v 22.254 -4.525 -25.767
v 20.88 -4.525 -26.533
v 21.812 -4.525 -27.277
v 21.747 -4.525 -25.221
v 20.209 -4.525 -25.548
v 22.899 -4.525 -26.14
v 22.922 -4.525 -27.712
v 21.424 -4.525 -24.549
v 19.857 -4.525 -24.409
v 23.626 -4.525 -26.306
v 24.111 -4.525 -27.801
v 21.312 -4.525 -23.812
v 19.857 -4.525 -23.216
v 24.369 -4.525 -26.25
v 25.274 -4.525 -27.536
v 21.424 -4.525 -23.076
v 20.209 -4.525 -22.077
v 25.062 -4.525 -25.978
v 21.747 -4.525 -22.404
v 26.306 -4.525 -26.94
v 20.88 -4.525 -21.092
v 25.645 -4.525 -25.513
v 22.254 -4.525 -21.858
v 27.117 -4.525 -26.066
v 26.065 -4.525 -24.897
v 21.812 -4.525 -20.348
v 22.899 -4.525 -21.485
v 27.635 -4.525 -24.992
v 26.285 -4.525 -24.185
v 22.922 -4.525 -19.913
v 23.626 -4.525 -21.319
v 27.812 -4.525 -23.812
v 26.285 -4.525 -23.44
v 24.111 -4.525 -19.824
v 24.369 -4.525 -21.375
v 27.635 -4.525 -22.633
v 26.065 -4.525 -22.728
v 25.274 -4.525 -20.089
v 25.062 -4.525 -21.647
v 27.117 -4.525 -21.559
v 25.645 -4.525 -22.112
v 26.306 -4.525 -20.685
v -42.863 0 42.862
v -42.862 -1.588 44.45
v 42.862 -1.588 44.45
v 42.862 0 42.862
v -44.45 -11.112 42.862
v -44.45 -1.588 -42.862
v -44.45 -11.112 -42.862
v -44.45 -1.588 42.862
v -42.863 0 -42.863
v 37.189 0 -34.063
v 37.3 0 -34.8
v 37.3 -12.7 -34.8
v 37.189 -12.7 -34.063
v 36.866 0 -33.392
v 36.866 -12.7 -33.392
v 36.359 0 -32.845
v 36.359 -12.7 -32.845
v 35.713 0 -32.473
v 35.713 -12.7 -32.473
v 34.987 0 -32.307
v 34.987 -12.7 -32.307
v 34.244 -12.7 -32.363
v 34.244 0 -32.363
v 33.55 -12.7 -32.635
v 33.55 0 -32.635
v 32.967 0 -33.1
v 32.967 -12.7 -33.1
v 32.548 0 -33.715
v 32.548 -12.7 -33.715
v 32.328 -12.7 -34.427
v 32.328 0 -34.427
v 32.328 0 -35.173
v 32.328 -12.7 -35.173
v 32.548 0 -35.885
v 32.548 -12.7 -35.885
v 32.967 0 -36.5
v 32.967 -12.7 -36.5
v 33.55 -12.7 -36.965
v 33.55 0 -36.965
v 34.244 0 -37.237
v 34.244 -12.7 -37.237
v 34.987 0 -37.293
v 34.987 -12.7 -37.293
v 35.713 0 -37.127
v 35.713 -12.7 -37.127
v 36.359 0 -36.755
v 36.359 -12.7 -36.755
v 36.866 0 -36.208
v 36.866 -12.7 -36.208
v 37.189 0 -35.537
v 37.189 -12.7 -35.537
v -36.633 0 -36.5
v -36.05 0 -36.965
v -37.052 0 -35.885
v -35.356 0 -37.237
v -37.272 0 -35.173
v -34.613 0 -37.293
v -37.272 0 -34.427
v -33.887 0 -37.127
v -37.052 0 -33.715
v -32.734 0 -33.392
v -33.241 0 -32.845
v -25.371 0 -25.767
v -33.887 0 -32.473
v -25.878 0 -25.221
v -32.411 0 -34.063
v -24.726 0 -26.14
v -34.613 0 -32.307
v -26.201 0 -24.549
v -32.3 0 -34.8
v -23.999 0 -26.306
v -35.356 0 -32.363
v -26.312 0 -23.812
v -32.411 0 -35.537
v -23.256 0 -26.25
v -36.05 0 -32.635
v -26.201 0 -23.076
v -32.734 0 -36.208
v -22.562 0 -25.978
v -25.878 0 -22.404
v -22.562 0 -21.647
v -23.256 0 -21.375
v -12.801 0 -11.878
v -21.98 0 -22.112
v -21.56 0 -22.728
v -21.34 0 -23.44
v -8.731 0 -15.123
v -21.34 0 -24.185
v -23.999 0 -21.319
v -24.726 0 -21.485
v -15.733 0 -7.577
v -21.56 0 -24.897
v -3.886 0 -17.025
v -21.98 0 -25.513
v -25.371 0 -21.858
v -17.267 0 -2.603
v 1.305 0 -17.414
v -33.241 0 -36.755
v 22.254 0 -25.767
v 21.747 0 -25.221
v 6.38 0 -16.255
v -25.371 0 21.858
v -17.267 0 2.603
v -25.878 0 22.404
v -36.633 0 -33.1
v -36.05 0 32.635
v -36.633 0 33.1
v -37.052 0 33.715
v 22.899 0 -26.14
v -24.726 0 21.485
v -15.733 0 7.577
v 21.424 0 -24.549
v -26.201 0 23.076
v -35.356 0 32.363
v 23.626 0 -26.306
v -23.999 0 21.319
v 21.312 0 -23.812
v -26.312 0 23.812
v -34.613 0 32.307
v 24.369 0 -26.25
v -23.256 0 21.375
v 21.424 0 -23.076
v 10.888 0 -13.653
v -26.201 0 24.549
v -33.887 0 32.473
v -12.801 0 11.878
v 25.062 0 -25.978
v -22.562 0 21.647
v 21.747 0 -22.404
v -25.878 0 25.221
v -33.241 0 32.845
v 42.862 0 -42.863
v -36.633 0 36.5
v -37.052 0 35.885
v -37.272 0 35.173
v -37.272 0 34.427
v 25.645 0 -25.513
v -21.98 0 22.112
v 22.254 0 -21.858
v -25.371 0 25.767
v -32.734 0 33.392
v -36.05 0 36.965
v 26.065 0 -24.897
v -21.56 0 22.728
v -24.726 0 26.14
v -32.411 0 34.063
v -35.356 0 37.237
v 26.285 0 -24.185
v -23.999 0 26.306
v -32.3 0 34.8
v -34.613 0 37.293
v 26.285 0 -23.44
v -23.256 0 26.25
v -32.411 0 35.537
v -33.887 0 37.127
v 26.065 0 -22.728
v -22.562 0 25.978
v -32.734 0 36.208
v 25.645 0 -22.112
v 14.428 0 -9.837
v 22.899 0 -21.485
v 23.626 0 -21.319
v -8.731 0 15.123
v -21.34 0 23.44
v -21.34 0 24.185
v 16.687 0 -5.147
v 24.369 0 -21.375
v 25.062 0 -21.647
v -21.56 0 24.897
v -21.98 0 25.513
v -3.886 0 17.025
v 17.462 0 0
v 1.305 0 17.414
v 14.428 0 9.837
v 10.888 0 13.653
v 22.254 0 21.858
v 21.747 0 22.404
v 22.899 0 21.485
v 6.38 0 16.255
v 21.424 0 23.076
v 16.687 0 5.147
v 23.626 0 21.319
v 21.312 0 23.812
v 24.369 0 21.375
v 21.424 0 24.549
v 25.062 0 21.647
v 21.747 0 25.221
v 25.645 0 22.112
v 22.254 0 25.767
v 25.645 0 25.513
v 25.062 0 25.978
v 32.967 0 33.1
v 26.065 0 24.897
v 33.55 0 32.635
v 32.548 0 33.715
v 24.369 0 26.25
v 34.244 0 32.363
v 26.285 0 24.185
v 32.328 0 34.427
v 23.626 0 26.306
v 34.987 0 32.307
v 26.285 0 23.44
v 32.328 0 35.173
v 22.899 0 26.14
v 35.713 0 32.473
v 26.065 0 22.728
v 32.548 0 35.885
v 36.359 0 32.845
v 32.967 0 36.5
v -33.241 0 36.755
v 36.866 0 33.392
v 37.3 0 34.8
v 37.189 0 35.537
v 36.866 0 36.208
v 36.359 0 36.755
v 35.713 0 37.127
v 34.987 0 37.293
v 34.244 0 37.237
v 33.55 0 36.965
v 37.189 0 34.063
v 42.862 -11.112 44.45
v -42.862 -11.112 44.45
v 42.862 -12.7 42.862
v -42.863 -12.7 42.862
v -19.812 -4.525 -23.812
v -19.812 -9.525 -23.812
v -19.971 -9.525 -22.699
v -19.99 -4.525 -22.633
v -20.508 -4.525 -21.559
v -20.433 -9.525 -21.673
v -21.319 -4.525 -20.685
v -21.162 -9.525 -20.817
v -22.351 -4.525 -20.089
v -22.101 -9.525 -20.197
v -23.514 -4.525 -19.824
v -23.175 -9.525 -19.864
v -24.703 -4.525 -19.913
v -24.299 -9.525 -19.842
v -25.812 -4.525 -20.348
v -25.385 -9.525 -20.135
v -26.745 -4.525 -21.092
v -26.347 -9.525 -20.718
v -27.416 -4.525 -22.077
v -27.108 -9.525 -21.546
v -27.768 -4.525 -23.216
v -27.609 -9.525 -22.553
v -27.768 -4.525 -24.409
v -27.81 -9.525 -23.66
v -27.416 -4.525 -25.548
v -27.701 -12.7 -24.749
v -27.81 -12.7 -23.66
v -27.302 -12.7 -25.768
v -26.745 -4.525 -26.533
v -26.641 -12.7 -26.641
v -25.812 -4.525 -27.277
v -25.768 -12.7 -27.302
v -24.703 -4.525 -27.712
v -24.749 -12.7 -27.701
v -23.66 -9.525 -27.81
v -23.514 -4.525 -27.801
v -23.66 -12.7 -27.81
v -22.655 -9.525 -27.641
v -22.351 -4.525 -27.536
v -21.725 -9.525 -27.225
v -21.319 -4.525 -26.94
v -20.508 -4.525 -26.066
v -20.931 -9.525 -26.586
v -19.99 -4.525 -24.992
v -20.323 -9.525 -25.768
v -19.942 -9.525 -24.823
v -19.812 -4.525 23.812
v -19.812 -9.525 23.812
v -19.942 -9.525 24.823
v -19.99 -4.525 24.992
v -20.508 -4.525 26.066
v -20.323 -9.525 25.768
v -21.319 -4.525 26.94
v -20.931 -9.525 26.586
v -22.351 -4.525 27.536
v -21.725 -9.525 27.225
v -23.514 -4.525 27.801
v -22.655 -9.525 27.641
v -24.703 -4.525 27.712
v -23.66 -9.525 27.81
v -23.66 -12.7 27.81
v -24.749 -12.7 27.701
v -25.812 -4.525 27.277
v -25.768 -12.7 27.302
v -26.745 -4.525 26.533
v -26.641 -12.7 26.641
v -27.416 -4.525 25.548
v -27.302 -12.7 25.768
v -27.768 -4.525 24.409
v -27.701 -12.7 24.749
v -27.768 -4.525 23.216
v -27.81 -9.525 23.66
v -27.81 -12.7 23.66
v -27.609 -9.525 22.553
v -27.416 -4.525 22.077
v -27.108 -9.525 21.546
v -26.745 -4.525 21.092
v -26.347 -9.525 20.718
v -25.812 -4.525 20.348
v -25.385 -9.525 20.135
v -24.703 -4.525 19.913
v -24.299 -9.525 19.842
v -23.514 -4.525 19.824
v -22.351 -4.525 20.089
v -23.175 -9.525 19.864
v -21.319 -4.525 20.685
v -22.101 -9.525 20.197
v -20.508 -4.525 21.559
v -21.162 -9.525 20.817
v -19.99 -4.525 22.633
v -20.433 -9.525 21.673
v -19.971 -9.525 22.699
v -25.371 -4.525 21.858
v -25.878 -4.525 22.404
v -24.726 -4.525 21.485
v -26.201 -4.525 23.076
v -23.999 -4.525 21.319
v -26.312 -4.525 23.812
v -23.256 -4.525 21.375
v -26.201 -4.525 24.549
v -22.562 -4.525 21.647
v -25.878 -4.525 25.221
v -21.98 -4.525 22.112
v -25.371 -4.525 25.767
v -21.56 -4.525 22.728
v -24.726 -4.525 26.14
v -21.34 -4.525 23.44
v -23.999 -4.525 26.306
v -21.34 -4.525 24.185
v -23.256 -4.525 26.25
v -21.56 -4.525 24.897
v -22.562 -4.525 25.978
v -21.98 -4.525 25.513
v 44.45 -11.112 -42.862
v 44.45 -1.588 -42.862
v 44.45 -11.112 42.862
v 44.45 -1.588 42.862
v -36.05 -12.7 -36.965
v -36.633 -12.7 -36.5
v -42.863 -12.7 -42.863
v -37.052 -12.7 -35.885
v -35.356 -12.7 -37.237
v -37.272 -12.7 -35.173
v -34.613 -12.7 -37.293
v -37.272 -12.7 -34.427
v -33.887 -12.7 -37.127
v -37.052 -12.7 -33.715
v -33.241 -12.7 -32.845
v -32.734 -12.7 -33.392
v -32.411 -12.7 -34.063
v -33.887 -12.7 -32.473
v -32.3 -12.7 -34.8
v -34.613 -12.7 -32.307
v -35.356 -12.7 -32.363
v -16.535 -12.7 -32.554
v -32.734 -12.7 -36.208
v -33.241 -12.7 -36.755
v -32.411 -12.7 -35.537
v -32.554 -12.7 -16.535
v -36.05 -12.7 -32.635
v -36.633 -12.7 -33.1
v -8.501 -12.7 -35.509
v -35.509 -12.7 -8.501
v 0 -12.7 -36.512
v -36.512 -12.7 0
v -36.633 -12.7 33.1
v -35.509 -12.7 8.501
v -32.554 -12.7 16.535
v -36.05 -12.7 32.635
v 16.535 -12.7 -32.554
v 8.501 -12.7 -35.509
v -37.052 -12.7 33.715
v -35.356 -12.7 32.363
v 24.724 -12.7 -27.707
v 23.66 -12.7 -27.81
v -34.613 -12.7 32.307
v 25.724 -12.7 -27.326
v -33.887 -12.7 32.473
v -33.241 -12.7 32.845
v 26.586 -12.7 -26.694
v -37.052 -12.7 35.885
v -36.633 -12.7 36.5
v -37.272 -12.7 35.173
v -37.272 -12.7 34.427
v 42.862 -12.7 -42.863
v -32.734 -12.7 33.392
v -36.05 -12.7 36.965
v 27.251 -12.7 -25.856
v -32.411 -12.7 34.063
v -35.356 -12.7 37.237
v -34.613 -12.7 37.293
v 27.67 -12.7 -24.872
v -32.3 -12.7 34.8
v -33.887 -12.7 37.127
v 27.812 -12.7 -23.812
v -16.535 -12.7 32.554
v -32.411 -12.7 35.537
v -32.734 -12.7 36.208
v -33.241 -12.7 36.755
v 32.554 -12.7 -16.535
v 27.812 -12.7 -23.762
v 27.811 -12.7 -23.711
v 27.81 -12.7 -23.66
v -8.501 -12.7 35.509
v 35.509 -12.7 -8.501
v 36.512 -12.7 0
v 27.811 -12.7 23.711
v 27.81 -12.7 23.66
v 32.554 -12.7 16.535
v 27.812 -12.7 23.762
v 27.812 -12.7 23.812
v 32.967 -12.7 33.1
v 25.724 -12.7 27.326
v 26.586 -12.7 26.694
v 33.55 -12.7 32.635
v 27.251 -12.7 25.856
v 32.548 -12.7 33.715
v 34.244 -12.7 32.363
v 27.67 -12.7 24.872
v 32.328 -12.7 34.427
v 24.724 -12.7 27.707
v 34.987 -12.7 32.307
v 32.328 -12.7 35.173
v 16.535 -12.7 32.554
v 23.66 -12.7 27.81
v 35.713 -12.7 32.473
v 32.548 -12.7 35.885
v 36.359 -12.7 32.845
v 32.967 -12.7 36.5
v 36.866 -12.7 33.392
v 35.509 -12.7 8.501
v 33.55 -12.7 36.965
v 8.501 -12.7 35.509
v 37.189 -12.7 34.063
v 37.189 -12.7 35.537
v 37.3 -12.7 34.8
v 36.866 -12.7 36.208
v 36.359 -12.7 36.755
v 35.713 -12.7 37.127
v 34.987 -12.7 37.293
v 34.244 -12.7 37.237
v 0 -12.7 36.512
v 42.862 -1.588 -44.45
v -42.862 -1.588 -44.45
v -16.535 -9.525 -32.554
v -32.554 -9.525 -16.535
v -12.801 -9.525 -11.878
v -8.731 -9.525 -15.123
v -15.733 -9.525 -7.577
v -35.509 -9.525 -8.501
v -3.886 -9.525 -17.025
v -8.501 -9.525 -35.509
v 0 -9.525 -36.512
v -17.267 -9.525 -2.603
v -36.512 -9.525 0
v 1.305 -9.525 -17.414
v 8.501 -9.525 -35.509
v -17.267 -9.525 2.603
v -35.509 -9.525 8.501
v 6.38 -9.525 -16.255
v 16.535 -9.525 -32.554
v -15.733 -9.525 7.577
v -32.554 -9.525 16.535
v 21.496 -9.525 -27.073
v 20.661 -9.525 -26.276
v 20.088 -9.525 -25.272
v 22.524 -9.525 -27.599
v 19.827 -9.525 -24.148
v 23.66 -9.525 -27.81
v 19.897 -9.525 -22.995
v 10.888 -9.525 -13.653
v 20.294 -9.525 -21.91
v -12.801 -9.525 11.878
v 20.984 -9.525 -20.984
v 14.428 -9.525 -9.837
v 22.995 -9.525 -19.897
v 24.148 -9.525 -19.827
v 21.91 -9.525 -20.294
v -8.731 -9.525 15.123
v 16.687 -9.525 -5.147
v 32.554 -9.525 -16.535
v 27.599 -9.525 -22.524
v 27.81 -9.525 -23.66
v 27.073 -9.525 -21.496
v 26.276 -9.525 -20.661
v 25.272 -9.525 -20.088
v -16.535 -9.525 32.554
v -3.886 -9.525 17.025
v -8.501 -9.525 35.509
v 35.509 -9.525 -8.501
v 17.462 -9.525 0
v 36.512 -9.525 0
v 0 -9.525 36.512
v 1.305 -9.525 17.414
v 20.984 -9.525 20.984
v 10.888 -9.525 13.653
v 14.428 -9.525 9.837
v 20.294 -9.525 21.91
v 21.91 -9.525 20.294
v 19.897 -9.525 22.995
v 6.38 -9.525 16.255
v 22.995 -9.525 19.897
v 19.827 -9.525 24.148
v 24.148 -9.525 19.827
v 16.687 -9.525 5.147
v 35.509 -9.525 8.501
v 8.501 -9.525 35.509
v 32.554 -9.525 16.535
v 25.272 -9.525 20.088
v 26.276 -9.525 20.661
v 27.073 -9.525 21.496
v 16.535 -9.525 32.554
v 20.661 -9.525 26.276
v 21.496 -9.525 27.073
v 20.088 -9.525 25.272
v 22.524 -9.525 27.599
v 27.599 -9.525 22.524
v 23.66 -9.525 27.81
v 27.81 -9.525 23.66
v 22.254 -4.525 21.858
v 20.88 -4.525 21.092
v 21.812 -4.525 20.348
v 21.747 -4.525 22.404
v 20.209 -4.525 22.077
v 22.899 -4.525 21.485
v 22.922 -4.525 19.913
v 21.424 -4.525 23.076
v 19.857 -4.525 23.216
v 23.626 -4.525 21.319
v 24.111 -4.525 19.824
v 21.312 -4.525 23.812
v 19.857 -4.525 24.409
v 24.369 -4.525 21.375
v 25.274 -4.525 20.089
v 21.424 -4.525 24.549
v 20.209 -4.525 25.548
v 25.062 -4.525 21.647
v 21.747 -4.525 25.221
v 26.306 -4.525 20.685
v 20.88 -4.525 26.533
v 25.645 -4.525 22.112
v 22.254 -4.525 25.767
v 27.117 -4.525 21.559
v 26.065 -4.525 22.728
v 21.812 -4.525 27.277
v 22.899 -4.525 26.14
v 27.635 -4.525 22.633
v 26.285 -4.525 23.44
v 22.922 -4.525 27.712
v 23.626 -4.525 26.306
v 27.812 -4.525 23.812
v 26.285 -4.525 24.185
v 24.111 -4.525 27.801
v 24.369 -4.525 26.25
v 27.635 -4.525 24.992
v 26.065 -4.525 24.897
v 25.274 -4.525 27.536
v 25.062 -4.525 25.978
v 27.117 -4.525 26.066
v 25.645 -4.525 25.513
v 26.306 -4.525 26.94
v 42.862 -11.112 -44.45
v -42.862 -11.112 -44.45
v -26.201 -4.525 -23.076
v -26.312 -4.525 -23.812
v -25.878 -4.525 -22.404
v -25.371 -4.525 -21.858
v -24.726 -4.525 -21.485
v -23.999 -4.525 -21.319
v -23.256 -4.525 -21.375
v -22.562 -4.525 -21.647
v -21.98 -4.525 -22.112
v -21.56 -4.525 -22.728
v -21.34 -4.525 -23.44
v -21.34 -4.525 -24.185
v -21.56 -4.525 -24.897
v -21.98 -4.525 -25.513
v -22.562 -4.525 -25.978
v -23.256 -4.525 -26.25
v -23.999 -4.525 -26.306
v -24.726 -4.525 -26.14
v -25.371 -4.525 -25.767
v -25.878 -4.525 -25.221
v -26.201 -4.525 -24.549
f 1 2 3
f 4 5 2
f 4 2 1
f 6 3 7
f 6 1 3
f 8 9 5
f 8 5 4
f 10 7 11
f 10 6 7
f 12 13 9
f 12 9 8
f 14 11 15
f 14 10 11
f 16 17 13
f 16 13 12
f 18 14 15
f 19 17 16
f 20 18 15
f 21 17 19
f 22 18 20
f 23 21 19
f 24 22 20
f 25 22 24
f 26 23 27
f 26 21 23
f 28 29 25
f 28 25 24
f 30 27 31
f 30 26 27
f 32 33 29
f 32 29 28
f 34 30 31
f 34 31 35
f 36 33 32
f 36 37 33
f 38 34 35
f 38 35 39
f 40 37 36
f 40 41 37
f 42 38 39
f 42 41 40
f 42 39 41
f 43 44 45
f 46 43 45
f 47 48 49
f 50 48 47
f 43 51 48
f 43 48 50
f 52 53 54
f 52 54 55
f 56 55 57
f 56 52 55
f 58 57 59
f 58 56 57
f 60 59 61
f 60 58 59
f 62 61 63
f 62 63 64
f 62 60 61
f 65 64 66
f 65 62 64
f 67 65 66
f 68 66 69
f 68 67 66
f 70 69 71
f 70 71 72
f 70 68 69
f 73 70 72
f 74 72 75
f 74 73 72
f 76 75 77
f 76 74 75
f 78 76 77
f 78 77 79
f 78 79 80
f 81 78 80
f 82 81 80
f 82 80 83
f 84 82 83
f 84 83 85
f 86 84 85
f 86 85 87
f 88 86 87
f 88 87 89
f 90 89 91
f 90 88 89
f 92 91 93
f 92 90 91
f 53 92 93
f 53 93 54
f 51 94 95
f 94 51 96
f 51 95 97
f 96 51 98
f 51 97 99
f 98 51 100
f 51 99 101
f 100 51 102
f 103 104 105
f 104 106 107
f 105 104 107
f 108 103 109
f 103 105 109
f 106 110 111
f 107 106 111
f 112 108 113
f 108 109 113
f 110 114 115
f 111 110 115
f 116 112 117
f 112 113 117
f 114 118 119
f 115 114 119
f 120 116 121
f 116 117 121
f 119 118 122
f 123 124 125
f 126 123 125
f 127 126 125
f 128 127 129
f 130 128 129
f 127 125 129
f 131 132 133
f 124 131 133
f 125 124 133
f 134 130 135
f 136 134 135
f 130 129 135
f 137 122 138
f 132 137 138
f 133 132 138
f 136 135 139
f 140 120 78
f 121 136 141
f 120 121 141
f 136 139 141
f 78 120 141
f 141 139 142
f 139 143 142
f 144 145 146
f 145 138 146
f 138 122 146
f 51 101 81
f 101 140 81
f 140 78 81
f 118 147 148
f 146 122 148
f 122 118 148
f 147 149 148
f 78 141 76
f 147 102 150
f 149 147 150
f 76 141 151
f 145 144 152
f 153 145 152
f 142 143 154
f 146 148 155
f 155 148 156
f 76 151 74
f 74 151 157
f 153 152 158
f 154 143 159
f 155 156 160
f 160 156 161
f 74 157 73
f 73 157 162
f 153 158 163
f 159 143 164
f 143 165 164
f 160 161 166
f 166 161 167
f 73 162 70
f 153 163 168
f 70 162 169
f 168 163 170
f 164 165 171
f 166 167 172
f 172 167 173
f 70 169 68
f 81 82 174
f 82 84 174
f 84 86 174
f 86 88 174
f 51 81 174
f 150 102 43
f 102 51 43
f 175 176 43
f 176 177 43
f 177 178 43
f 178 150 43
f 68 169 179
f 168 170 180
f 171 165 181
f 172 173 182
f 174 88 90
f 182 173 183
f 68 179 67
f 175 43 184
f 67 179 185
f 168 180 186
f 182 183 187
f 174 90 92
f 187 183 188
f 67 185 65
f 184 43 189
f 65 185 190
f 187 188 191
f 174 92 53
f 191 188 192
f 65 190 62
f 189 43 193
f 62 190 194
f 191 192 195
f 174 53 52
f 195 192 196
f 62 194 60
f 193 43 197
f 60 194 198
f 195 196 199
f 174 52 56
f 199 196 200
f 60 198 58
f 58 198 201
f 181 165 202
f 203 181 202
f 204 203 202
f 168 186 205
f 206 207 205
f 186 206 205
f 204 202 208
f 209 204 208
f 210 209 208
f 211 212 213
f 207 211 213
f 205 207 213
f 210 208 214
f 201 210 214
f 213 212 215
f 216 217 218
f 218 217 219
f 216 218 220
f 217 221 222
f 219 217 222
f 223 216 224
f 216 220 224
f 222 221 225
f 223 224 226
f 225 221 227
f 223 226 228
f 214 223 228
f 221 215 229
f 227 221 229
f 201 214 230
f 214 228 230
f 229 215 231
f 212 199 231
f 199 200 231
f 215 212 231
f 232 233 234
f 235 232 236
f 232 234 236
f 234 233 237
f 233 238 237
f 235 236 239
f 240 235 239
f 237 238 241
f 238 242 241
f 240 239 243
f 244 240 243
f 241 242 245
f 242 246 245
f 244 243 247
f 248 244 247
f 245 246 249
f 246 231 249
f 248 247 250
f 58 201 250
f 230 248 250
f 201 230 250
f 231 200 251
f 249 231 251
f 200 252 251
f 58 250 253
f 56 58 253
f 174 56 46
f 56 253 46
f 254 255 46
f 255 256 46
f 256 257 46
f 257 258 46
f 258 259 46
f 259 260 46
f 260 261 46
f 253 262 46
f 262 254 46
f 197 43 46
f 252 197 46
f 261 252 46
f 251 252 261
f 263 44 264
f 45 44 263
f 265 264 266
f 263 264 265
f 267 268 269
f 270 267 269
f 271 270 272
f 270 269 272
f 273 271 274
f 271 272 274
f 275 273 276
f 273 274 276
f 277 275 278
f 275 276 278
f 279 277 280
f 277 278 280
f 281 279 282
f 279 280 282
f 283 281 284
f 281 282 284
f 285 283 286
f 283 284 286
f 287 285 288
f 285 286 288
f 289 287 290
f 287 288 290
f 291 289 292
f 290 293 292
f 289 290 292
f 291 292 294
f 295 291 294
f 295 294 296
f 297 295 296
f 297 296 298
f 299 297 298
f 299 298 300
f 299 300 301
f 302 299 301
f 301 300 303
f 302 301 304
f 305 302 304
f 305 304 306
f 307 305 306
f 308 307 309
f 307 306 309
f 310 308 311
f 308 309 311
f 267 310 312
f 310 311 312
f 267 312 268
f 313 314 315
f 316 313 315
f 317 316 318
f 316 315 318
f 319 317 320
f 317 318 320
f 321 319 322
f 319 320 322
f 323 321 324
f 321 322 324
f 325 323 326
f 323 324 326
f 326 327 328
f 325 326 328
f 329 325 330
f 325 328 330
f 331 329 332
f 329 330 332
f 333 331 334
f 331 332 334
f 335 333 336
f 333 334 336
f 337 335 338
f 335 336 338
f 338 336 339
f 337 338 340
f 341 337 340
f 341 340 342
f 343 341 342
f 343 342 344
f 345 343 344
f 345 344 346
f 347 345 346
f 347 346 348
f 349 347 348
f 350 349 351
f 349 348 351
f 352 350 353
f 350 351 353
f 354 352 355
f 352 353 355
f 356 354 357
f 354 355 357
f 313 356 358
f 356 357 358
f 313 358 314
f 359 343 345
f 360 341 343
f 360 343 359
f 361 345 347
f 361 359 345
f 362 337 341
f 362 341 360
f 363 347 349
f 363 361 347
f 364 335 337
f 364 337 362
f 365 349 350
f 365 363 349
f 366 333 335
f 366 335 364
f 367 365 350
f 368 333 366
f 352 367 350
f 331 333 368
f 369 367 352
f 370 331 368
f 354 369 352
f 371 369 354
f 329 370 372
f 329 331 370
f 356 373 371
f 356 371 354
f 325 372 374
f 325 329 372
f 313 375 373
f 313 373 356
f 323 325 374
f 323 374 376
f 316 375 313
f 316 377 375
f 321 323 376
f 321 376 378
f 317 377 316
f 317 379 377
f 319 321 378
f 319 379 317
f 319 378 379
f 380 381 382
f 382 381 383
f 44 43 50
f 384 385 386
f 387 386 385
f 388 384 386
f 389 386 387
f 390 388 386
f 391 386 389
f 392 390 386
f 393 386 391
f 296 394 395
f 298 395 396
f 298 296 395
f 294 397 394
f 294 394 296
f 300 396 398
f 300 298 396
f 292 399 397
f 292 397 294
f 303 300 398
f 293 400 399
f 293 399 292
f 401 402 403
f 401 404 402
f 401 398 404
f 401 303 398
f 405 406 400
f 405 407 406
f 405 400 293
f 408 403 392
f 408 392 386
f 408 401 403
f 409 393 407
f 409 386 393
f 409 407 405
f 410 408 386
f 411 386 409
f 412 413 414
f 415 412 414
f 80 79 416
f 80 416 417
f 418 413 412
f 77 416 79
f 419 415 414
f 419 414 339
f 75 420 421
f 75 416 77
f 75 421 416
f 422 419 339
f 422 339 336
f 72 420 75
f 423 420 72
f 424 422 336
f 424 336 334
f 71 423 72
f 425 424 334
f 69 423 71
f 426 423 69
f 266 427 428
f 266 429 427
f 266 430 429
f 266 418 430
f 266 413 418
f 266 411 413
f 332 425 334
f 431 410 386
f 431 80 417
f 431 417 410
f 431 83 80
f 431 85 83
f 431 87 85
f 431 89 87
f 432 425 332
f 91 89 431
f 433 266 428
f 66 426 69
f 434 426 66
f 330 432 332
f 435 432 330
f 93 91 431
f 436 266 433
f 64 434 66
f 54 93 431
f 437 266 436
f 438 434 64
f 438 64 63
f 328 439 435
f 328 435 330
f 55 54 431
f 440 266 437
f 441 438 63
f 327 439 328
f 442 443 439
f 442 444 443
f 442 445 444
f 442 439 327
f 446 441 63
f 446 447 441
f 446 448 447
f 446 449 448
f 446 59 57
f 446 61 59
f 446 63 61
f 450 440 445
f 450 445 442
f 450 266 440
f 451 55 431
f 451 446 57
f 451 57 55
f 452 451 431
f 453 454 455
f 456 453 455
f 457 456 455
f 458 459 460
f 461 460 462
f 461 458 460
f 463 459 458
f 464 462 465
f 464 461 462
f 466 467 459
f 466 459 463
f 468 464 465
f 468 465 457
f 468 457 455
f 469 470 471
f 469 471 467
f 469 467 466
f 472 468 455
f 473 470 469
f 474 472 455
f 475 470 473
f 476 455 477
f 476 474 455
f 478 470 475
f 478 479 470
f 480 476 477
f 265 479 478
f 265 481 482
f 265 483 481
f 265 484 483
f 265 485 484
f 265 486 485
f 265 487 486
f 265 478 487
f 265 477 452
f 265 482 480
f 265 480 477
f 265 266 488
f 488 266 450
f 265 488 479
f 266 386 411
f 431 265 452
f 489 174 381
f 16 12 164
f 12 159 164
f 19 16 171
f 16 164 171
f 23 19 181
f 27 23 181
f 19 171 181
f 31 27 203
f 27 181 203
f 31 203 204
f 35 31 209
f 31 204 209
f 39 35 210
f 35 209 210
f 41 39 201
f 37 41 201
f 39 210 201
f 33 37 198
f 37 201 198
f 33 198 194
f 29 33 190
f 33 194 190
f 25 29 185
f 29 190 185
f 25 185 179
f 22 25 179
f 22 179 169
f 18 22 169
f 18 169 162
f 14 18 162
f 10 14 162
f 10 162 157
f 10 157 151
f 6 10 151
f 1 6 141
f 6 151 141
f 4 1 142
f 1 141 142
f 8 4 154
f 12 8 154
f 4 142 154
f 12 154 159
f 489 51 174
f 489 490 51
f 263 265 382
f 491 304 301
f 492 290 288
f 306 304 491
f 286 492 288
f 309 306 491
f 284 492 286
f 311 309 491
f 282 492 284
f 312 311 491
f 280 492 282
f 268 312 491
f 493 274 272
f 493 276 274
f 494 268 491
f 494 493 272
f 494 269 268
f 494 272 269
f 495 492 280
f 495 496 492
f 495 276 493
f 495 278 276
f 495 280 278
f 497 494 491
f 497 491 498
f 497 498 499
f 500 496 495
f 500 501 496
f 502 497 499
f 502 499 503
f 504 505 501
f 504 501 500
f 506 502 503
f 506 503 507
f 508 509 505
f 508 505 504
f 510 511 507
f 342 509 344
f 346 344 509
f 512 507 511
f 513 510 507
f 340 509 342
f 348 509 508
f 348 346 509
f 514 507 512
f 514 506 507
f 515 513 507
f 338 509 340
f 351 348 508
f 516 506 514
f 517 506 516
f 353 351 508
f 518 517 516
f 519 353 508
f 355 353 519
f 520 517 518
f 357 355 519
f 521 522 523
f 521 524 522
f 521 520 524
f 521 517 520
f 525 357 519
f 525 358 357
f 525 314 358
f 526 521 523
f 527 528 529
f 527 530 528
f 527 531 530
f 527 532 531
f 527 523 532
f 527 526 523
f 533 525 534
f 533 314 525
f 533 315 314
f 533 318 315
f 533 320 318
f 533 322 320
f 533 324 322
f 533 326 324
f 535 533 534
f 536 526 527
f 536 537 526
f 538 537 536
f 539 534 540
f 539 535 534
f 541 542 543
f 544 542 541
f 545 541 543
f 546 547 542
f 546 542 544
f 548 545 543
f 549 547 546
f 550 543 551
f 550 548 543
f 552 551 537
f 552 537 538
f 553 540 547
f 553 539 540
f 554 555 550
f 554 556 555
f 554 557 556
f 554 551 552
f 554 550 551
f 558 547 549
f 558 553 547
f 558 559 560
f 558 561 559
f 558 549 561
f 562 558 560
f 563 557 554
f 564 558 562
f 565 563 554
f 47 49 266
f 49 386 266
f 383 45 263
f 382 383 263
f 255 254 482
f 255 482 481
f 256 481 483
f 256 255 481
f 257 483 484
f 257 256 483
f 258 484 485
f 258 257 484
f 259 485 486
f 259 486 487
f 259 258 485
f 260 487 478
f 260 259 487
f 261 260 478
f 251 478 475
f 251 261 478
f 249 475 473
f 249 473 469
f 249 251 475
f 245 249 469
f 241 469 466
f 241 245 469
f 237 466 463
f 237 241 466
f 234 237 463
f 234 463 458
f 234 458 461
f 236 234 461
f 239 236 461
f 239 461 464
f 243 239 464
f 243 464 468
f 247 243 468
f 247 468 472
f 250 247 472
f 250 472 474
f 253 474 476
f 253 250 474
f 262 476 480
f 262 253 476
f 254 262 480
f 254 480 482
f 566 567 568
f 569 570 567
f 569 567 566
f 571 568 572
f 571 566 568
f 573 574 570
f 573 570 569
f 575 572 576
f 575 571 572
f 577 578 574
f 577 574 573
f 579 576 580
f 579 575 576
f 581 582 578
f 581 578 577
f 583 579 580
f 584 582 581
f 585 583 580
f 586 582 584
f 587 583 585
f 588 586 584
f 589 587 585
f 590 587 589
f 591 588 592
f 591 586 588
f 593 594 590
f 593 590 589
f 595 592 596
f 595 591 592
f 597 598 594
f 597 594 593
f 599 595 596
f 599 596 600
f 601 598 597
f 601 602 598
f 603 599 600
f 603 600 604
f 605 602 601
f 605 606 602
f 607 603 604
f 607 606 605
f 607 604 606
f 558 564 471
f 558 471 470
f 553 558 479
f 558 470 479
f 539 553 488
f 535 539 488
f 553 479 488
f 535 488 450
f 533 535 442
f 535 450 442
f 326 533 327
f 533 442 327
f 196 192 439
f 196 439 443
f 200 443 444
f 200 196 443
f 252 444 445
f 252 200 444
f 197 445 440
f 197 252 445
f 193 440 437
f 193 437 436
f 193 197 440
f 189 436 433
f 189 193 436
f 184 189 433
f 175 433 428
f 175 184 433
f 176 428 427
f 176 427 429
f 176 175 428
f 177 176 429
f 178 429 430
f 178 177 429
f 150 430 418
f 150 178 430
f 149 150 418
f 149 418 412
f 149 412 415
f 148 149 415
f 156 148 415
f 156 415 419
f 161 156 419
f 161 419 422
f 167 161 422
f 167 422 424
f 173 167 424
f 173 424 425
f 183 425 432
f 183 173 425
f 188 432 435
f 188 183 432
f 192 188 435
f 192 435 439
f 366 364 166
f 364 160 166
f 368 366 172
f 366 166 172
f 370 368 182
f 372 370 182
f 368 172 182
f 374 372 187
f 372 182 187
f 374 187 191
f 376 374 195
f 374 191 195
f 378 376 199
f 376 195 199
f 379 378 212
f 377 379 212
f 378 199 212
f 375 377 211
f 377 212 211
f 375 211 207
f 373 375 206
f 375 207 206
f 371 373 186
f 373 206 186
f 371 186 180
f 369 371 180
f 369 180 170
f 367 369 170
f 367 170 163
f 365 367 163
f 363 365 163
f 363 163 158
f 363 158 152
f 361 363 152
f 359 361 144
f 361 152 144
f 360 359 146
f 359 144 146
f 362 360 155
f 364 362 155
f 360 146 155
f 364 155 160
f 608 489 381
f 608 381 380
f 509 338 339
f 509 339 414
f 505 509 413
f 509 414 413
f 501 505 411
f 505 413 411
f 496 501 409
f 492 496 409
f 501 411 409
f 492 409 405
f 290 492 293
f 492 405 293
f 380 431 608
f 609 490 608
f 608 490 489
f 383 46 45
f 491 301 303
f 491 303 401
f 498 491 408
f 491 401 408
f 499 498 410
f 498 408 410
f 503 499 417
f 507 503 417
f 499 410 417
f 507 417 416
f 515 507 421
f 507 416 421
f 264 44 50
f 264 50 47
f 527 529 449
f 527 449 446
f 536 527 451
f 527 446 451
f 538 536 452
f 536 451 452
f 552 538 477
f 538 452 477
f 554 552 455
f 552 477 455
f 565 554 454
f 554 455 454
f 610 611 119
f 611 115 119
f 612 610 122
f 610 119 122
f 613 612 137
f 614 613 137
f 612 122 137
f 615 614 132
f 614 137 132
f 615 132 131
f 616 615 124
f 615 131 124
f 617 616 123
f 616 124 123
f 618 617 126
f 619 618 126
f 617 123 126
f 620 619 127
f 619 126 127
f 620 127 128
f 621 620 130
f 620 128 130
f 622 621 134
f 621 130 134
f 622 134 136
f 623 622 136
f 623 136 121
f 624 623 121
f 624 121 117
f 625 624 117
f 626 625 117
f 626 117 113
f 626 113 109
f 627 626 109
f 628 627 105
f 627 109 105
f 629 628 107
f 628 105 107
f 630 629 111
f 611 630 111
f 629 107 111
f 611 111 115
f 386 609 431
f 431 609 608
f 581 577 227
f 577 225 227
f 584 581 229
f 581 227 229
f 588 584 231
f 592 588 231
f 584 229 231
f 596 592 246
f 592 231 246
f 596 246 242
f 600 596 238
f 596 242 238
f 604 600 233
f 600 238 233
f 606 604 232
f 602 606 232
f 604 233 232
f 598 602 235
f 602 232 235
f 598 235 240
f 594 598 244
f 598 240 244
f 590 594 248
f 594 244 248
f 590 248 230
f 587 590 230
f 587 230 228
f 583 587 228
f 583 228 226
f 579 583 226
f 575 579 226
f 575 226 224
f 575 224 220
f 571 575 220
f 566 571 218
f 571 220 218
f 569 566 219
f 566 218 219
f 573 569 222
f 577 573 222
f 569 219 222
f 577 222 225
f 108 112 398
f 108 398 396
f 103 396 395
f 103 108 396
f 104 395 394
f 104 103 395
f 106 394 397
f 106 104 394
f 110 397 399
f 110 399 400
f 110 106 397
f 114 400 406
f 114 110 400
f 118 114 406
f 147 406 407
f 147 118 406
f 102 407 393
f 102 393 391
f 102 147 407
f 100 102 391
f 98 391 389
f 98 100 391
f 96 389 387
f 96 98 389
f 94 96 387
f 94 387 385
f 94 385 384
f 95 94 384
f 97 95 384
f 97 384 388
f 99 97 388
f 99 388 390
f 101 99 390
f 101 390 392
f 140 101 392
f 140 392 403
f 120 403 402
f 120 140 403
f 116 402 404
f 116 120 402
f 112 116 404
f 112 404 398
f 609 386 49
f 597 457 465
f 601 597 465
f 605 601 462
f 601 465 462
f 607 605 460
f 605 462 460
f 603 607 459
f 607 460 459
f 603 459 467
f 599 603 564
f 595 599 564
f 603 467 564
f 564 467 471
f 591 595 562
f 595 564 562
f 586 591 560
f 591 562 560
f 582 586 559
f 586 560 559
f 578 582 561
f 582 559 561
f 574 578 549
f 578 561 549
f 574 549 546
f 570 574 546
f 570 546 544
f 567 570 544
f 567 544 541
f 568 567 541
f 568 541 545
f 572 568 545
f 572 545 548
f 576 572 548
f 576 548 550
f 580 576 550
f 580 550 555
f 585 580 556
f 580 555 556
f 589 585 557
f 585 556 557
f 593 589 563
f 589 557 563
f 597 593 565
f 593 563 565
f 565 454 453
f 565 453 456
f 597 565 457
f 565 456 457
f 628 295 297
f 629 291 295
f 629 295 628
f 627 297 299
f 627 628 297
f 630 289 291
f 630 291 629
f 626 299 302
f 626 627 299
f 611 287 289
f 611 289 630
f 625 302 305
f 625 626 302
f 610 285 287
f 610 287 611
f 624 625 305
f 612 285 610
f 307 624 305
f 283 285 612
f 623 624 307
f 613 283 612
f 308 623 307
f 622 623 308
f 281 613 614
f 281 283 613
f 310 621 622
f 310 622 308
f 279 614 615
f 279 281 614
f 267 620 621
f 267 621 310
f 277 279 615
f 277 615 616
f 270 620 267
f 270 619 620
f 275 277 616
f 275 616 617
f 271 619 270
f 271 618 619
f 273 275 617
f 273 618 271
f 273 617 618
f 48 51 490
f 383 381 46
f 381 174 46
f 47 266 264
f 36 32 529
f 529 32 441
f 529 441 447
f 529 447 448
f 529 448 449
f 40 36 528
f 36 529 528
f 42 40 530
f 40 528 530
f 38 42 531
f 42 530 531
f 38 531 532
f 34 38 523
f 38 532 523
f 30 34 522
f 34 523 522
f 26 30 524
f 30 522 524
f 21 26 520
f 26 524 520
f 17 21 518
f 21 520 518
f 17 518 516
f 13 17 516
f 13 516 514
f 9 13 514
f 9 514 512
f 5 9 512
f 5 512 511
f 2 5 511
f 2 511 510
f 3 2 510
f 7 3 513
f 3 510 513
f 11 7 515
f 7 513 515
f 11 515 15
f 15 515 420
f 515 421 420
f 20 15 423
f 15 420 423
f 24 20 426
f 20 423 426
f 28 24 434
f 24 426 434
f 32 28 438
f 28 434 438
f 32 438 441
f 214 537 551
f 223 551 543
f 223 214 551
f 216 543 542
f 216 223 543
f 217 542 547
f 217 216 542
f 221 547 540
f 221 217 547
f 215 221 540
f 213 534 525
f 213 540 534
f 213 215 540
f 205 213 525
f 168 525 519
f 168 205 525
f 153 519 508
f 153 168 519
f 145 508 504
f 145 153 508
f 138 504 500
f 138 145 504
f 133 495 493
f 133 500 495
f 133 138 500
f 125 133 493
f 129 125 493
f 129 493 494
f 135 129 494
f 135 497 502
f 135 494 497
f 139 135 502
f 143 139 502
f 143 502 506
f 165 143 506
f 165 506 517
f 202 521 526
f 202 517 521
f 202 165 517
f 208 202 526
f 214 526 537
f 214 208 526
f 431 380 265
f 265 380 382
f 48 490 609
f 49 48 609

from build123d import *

# Parameters (mm, degrees)
F0_W           = 88.9
F0_H           = 88.9
F0_R           = 2.5
F0_R_2         = 17.4625
F1_DEPTH       = 12.7
F2_R           = 36.5125
F3_DEPTH       = 3.175
F5_D           = 5
F5_START       = 3.175
F5_CBORE_D     = 8
F5_CBORE_DEPTH = 5
F6_SIZE        = 1.5875


with BuildPart() as f1:
    # F0 (on Front) → F1 (new body)
    with BuildSketch(Plane.XZ):
        Rectangle(F0_W, F0_H)
        with Locations((-34.8, -34.8)):
            Circle(F0_R, mode=Mode.SUBTRACT)
        with Locations((34.8, -34.8)):
            Circle(F0_R, mode=Mode.SUBTRACT)
        with Locations((-34.8, 34.8)):
            Circle(F0_R, mode=Mode.SUBTRACT)
        Circle(F0_R_2, mode=Mode.SUBTRACT)
        with Locations((34.8, 34.8)):
            Circle(F0_R, mode=Mode.SUBTRACT)
    extrude(amount=F1_DEPTH)

    # F2 (on face) → F3 (cut)
    with BuildSketch(Plane.XZ.offset(12.7)):
        Circle(F2_R)
    extrude(amount=-F3_DEPTH, mode=Mode.SUBTRACT)

    # F5 (through all)
    # its depths count from where the whole tool has entered the part; down to there all is cleared
    with Locations(Plane.XZ.offset(12.7).offset(-F5_START)):
        with Locations((-23.8125, 23.8125), (23.8125, 23.8125), (23.8125, -23.8125), (-23.8125, -23.8125)):
            CounterBoreHole(F5_D / 2, F5_CBORE_D / 2, F5_CBORE_DEPTH)

    # F6
    f6_edges = [f1.edges().sort_by_distance(p)[0] for p in [
        (0, -12.7, 44.45),
        (-44.45, -12.7, 0),
        (44.45, -12.7, 0),
        (0, -12.7, -44.45),
        (44.45, 0, 0),
        (0, 0, -44.45),
        (-44.45, 0, 0),
        (0, 0, 44.45),
        (-44.45, -6.35, 44.45),
        (-44.45, -6.35, -44.45),
        (44.45, -6.35, 44.45),
        (44.45, -6.35, -44.45),
    ]]
    chamfer(f6_edges, length=F6_SIZE)


solid = f1.part
